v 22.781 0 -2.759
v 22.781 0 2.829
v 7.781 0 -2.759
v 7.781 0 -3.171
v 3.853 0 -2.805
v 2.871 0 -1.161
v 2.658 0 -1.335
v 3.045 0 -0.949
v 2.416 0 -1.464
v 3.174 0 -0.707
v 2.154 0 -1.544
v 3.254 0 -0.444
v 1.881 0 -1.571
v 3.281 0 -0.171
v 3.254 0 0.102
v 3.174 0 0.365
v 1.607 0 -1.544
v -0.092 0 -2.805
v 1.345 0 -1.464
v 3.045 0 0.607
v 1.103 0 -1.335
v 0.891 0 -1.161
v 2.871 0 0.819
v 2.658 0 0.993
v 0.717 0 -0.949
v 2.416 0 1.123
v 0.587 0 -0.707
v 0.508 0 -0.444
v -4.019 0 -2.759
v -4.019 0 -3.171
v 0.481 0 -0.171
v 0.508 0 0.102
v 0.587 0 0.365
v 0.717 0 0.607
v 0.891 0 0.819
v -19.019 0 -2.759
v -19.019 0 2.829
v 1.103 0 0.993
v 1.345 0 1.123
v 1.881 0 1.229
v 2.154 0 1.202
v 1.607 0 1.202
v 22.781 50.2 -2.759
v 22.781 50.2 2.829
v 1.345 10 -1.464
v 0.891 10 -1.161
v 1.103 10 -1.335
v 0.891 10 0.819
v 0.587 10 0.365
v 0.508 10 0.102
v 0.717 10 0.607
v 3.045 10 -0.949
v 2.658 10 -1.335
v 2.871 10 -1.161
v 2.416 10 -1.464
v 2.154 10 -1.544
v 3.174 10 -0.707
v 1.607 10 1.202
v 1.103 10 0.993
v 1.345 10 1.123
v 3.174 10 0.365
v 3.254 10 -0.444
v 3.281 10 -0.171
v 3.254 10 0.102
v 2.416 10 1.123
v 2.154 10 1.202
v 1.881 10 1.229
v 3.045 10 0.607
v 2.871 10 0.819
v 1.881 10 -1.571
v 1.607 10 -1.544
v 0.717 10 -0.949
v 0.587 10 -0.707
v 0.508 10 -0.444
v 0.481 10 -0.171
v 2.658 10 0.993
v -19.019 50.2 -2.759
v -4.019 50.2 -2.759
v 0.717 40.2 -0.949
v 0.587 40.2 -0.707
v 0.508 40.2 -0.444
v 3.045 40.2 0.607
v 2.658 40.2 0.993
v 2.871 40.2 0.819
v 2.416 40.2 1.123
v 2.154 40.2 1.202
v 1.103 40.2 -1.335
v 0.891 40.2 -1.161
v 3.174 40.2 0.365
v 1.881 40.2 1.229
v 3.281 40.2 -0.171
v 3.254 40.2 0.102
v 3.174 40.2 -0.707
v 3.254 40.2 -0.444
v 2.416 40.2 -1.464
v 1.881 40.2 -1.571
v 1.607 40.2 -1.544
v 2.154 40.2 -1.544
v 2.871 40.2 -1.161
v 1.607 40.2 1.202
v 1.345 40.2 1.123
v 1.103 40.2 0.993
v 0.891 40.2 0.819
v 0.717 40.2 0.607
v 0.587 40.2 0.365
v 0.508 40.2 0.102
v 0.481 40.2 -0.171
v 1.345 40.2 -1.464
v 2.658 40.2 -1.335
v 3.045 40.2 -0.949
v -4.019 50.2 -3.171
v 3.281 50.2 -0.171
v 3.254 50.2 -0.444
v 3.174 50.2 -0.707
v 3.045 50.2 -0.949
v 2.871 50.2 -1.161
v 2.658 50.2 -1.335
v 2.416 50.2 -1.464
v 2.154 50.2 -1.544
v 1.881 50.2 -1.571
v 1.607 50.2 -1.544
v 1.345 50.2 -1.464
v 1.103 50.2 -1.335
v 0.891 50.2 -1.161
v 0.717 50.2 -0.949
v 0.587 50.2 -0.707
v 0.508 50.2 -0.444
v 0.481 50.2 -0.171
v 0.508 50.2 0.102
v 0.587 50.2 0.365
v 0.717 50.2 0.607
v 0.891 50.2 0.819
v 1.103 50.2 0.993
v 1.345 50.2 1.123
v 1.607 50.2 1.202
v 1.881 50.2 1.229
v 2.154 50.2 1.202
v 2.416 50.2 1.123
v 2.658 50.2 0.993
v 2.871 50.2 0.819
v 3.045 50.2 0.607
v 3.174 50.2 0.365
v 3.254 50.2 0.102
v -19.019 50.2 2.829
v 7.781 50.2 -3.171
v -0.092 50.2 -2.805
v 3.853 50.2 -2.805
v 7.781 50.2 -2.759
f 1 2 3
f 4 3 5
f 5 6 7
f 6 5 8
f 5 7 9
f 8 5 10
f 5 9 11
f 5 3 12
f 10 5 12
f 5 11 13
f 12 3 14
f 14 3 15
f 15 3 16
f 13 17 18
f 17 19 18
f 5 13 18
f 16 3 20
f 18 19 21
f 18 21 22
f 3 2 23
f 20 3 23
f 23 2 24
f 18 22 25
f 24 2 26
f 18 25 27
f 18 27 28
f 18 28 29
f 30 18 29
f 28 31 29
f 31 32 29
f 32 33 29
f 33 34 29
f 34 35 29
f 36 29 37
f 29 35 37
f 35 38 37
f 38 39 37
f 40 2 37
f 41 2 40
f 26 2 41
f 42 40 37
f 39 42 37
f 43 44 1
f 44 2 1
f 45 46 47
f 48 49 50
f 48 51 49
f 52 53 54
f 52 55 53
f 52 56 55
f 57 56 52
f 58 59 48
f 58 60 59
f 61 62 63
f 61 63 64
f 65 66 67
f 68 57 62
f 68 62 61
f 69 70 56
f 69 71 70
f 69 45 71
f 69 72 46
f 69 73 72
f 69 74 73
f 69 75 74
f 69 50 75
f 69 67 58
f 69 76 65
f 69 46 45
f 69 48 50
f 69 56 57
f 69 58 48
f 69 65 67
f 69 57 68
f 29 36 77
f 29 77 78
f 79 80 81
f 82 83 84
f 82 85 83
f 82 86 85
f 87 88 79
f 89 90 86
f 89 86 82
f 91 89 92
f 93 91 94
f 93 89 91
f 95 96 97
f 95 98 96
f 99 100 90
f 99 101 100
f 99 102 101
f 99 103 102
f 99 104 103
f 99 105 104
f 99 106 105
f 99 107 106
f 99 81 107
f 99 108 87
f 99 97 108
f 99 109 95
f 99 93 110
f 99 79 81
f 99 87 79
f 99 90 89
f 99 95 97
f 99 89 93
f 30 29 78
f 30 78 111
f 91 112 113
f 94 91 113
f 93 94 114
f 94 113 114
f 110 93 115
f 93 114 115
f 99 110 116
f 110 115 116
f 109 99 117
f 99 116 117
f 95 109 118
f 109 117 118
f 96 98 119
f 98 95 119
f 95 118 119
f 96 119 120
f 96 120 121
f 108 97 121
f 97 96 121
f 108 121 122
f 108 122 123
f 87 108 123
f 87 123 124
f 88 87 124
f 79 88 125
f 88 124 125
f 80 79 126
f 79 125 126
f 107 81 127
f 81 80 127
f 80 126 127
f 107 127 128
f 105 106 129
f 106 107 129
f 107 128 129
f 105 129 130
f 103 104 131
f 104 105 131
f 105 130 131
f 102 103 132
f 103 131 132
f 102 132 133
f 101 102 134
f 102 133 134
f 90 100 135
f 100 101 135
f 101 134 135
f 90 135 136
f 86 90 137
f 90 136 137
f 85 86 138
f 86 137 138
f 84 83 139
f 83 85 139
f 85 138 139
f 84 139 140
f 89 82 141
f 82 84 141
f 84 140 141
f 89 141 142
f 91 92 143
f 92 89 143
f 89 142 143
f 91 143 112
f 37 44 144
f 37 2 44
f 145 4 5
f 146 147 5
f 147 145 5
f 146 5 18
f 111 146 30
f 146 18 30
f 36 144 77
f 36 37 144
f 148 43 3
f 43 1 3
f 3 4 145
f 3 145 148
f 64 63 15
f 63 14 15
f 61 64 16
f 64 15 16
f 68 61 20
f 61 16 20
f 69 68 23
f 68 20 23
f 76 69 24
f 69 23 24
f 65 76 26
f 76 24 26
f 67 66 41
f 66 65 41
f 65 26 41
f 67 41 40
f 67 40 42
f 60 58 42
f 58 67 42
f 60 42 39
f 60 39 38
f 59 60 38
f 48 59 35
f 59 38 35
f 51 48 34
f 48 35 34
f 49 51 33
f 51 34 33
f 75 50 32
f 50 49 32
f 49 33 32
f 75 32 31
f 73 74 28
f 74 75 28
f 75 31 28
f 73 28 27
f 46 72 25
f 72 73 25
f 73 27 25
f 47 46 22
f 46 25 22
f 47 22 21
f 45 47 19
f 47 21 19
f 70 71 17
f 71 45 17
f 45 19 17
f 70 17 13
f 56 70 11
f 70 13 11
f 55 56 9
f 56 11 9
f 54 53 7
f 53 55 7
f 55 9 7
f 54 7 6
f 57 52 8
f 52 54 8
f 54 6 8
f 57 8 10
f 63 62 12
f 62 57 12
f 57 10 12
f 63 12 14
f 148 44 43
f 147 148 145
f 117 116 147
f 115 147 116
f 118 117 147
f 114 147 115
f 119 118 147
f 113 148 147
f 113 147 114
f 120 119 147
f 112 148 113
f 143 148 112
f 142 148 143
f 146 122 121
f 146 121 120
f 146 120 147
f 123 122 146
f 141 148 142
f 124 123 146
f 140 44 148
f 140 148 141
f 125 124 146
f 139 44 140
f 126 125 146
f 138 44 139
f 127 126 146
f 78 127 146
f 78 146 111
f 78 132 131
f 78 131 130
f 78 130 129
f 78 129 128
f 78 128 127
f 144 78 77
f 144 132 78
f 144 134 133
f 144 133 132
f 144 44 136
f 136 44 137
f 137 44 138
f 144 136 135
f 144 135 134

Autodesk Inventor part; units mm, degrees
ref_plane "YZ Plane" through (0, 0, 0) normal (1, 0, 0) x (0, 1, 0)
ref_plane "XZ Plane" through (0, 0, 0) normal (0, 1, 0) x (-1, 0, 0)
sketch "Эскиз1" plane through (0, 0, 0) normal (0, 1, 0) x (-1, 0, 0)
  arc A0 (4.0194, -3.1709) -> (-7.7806, -3.1709) centre (-1.8806, -45.2594) ccw
  line L0 (-7.7806, -3.1709) -> (-7.7806, 2.8291)
  line L1 (-7.7806, 2.8291) -> (4.0194, 2.8291)
  line L2 (4.0194, 2.8291) -> (4.0194, -3.1709)
  point P0 (0, -39)
  dimension "d1" = 6
  dimension "d12" = 11.8
extrude "Выдавливание1" add sketch "Эскиз1" along normal blind 50.2
sketch "Эскиз2" plane through (0, 50.2, 0) normal (0, 1, 0) x (1, 0, 0)
  line L0 (-4.0194, -2.8291) -> (7.7806, -2.8291) projected
  line L1 (1.8806, -2.8291) -> (1.8806, 0.1709)
  circle A0 centre (1.8806, 0.1709) radius 1.4
  point P0 (0, 0)
  dimension "d5" = 3
  dimension "d6" = 2.8
extrude "Выдавливание2" cut sketch "Эскиз2" against normal blind 10
sketch "Эскиз3" plane through (0, 0, 0) normal (0, -1, 0) x (1, 0, 0)
  line L0 (-4.0194, 2.8291) -> (7.7806, 2.8291) projected
  line L1 (1.8806, 2.8291) -> (1.8806, -0.1709)
  circle A0 centre (1.8806, -0.1709) radius 1.4
  point P0 (0, 0)
  dimension "d9" = 3
extrude "Выдавливание3" cut sketch "Эскиз3" against normal blind 10
sketch "Эскиз4" plane through (0, 0, 0) normal (0, -1, 0) x (1, 0, 0)
  arc A0 (7.7806, -3.1709) -> (-4.0194, -3.1709) centre (1.8806, -45.2594) ccw projected
  line L0 (1.8806, -2.7594) -> (-4.0194, -2.7594)
  line L1 (-4.0194, -3.1709) -> (-4.0194, 2.8291) projected
  line L2 (-4.0194, 2.8291) -> (-19.0194, 2.8291)
  line L3 (-19.0194, 2.8291) -> (-19.0194, -2.7594)
  line L4 (-19.0194, -2.7594) -> (-4.0194, -2.7594)
  line L5 (-4.0194, -2.7594) -> (-4.0194, 2.8291)
  line L6 (7.7806, 2.8291) -> (7.7806, -3.1709) projected
  line L7 (7.7806, 2.8291) -> (22.7806, 2.8291)
  line L8 (22.7806, 2.8291) -> (22.7806, -2.7594)
  line L9 (22.7806, -2.7594) -> (7.7806, -2.7594)
  line L10 (7.7806, -2.7594) -> (7.7806, 2.8291)
  point P0 (0, 0)
  dimension "d13" = 15
  dimension "d16" = 15
extrude "Выдавливание4" add sketch "Эскиз4" against normal up to surface (50.2 mm away) contours L4 L3 L2 L1 | L6 L7 L8 L9
ref_plane "РабПлоскость1" through (0.4806, 50.2, -0.1709) normal (-1, 0, 0) x (0, -1, 0)
properties part number "joint3_rot_con" material "Пластик АБС"
